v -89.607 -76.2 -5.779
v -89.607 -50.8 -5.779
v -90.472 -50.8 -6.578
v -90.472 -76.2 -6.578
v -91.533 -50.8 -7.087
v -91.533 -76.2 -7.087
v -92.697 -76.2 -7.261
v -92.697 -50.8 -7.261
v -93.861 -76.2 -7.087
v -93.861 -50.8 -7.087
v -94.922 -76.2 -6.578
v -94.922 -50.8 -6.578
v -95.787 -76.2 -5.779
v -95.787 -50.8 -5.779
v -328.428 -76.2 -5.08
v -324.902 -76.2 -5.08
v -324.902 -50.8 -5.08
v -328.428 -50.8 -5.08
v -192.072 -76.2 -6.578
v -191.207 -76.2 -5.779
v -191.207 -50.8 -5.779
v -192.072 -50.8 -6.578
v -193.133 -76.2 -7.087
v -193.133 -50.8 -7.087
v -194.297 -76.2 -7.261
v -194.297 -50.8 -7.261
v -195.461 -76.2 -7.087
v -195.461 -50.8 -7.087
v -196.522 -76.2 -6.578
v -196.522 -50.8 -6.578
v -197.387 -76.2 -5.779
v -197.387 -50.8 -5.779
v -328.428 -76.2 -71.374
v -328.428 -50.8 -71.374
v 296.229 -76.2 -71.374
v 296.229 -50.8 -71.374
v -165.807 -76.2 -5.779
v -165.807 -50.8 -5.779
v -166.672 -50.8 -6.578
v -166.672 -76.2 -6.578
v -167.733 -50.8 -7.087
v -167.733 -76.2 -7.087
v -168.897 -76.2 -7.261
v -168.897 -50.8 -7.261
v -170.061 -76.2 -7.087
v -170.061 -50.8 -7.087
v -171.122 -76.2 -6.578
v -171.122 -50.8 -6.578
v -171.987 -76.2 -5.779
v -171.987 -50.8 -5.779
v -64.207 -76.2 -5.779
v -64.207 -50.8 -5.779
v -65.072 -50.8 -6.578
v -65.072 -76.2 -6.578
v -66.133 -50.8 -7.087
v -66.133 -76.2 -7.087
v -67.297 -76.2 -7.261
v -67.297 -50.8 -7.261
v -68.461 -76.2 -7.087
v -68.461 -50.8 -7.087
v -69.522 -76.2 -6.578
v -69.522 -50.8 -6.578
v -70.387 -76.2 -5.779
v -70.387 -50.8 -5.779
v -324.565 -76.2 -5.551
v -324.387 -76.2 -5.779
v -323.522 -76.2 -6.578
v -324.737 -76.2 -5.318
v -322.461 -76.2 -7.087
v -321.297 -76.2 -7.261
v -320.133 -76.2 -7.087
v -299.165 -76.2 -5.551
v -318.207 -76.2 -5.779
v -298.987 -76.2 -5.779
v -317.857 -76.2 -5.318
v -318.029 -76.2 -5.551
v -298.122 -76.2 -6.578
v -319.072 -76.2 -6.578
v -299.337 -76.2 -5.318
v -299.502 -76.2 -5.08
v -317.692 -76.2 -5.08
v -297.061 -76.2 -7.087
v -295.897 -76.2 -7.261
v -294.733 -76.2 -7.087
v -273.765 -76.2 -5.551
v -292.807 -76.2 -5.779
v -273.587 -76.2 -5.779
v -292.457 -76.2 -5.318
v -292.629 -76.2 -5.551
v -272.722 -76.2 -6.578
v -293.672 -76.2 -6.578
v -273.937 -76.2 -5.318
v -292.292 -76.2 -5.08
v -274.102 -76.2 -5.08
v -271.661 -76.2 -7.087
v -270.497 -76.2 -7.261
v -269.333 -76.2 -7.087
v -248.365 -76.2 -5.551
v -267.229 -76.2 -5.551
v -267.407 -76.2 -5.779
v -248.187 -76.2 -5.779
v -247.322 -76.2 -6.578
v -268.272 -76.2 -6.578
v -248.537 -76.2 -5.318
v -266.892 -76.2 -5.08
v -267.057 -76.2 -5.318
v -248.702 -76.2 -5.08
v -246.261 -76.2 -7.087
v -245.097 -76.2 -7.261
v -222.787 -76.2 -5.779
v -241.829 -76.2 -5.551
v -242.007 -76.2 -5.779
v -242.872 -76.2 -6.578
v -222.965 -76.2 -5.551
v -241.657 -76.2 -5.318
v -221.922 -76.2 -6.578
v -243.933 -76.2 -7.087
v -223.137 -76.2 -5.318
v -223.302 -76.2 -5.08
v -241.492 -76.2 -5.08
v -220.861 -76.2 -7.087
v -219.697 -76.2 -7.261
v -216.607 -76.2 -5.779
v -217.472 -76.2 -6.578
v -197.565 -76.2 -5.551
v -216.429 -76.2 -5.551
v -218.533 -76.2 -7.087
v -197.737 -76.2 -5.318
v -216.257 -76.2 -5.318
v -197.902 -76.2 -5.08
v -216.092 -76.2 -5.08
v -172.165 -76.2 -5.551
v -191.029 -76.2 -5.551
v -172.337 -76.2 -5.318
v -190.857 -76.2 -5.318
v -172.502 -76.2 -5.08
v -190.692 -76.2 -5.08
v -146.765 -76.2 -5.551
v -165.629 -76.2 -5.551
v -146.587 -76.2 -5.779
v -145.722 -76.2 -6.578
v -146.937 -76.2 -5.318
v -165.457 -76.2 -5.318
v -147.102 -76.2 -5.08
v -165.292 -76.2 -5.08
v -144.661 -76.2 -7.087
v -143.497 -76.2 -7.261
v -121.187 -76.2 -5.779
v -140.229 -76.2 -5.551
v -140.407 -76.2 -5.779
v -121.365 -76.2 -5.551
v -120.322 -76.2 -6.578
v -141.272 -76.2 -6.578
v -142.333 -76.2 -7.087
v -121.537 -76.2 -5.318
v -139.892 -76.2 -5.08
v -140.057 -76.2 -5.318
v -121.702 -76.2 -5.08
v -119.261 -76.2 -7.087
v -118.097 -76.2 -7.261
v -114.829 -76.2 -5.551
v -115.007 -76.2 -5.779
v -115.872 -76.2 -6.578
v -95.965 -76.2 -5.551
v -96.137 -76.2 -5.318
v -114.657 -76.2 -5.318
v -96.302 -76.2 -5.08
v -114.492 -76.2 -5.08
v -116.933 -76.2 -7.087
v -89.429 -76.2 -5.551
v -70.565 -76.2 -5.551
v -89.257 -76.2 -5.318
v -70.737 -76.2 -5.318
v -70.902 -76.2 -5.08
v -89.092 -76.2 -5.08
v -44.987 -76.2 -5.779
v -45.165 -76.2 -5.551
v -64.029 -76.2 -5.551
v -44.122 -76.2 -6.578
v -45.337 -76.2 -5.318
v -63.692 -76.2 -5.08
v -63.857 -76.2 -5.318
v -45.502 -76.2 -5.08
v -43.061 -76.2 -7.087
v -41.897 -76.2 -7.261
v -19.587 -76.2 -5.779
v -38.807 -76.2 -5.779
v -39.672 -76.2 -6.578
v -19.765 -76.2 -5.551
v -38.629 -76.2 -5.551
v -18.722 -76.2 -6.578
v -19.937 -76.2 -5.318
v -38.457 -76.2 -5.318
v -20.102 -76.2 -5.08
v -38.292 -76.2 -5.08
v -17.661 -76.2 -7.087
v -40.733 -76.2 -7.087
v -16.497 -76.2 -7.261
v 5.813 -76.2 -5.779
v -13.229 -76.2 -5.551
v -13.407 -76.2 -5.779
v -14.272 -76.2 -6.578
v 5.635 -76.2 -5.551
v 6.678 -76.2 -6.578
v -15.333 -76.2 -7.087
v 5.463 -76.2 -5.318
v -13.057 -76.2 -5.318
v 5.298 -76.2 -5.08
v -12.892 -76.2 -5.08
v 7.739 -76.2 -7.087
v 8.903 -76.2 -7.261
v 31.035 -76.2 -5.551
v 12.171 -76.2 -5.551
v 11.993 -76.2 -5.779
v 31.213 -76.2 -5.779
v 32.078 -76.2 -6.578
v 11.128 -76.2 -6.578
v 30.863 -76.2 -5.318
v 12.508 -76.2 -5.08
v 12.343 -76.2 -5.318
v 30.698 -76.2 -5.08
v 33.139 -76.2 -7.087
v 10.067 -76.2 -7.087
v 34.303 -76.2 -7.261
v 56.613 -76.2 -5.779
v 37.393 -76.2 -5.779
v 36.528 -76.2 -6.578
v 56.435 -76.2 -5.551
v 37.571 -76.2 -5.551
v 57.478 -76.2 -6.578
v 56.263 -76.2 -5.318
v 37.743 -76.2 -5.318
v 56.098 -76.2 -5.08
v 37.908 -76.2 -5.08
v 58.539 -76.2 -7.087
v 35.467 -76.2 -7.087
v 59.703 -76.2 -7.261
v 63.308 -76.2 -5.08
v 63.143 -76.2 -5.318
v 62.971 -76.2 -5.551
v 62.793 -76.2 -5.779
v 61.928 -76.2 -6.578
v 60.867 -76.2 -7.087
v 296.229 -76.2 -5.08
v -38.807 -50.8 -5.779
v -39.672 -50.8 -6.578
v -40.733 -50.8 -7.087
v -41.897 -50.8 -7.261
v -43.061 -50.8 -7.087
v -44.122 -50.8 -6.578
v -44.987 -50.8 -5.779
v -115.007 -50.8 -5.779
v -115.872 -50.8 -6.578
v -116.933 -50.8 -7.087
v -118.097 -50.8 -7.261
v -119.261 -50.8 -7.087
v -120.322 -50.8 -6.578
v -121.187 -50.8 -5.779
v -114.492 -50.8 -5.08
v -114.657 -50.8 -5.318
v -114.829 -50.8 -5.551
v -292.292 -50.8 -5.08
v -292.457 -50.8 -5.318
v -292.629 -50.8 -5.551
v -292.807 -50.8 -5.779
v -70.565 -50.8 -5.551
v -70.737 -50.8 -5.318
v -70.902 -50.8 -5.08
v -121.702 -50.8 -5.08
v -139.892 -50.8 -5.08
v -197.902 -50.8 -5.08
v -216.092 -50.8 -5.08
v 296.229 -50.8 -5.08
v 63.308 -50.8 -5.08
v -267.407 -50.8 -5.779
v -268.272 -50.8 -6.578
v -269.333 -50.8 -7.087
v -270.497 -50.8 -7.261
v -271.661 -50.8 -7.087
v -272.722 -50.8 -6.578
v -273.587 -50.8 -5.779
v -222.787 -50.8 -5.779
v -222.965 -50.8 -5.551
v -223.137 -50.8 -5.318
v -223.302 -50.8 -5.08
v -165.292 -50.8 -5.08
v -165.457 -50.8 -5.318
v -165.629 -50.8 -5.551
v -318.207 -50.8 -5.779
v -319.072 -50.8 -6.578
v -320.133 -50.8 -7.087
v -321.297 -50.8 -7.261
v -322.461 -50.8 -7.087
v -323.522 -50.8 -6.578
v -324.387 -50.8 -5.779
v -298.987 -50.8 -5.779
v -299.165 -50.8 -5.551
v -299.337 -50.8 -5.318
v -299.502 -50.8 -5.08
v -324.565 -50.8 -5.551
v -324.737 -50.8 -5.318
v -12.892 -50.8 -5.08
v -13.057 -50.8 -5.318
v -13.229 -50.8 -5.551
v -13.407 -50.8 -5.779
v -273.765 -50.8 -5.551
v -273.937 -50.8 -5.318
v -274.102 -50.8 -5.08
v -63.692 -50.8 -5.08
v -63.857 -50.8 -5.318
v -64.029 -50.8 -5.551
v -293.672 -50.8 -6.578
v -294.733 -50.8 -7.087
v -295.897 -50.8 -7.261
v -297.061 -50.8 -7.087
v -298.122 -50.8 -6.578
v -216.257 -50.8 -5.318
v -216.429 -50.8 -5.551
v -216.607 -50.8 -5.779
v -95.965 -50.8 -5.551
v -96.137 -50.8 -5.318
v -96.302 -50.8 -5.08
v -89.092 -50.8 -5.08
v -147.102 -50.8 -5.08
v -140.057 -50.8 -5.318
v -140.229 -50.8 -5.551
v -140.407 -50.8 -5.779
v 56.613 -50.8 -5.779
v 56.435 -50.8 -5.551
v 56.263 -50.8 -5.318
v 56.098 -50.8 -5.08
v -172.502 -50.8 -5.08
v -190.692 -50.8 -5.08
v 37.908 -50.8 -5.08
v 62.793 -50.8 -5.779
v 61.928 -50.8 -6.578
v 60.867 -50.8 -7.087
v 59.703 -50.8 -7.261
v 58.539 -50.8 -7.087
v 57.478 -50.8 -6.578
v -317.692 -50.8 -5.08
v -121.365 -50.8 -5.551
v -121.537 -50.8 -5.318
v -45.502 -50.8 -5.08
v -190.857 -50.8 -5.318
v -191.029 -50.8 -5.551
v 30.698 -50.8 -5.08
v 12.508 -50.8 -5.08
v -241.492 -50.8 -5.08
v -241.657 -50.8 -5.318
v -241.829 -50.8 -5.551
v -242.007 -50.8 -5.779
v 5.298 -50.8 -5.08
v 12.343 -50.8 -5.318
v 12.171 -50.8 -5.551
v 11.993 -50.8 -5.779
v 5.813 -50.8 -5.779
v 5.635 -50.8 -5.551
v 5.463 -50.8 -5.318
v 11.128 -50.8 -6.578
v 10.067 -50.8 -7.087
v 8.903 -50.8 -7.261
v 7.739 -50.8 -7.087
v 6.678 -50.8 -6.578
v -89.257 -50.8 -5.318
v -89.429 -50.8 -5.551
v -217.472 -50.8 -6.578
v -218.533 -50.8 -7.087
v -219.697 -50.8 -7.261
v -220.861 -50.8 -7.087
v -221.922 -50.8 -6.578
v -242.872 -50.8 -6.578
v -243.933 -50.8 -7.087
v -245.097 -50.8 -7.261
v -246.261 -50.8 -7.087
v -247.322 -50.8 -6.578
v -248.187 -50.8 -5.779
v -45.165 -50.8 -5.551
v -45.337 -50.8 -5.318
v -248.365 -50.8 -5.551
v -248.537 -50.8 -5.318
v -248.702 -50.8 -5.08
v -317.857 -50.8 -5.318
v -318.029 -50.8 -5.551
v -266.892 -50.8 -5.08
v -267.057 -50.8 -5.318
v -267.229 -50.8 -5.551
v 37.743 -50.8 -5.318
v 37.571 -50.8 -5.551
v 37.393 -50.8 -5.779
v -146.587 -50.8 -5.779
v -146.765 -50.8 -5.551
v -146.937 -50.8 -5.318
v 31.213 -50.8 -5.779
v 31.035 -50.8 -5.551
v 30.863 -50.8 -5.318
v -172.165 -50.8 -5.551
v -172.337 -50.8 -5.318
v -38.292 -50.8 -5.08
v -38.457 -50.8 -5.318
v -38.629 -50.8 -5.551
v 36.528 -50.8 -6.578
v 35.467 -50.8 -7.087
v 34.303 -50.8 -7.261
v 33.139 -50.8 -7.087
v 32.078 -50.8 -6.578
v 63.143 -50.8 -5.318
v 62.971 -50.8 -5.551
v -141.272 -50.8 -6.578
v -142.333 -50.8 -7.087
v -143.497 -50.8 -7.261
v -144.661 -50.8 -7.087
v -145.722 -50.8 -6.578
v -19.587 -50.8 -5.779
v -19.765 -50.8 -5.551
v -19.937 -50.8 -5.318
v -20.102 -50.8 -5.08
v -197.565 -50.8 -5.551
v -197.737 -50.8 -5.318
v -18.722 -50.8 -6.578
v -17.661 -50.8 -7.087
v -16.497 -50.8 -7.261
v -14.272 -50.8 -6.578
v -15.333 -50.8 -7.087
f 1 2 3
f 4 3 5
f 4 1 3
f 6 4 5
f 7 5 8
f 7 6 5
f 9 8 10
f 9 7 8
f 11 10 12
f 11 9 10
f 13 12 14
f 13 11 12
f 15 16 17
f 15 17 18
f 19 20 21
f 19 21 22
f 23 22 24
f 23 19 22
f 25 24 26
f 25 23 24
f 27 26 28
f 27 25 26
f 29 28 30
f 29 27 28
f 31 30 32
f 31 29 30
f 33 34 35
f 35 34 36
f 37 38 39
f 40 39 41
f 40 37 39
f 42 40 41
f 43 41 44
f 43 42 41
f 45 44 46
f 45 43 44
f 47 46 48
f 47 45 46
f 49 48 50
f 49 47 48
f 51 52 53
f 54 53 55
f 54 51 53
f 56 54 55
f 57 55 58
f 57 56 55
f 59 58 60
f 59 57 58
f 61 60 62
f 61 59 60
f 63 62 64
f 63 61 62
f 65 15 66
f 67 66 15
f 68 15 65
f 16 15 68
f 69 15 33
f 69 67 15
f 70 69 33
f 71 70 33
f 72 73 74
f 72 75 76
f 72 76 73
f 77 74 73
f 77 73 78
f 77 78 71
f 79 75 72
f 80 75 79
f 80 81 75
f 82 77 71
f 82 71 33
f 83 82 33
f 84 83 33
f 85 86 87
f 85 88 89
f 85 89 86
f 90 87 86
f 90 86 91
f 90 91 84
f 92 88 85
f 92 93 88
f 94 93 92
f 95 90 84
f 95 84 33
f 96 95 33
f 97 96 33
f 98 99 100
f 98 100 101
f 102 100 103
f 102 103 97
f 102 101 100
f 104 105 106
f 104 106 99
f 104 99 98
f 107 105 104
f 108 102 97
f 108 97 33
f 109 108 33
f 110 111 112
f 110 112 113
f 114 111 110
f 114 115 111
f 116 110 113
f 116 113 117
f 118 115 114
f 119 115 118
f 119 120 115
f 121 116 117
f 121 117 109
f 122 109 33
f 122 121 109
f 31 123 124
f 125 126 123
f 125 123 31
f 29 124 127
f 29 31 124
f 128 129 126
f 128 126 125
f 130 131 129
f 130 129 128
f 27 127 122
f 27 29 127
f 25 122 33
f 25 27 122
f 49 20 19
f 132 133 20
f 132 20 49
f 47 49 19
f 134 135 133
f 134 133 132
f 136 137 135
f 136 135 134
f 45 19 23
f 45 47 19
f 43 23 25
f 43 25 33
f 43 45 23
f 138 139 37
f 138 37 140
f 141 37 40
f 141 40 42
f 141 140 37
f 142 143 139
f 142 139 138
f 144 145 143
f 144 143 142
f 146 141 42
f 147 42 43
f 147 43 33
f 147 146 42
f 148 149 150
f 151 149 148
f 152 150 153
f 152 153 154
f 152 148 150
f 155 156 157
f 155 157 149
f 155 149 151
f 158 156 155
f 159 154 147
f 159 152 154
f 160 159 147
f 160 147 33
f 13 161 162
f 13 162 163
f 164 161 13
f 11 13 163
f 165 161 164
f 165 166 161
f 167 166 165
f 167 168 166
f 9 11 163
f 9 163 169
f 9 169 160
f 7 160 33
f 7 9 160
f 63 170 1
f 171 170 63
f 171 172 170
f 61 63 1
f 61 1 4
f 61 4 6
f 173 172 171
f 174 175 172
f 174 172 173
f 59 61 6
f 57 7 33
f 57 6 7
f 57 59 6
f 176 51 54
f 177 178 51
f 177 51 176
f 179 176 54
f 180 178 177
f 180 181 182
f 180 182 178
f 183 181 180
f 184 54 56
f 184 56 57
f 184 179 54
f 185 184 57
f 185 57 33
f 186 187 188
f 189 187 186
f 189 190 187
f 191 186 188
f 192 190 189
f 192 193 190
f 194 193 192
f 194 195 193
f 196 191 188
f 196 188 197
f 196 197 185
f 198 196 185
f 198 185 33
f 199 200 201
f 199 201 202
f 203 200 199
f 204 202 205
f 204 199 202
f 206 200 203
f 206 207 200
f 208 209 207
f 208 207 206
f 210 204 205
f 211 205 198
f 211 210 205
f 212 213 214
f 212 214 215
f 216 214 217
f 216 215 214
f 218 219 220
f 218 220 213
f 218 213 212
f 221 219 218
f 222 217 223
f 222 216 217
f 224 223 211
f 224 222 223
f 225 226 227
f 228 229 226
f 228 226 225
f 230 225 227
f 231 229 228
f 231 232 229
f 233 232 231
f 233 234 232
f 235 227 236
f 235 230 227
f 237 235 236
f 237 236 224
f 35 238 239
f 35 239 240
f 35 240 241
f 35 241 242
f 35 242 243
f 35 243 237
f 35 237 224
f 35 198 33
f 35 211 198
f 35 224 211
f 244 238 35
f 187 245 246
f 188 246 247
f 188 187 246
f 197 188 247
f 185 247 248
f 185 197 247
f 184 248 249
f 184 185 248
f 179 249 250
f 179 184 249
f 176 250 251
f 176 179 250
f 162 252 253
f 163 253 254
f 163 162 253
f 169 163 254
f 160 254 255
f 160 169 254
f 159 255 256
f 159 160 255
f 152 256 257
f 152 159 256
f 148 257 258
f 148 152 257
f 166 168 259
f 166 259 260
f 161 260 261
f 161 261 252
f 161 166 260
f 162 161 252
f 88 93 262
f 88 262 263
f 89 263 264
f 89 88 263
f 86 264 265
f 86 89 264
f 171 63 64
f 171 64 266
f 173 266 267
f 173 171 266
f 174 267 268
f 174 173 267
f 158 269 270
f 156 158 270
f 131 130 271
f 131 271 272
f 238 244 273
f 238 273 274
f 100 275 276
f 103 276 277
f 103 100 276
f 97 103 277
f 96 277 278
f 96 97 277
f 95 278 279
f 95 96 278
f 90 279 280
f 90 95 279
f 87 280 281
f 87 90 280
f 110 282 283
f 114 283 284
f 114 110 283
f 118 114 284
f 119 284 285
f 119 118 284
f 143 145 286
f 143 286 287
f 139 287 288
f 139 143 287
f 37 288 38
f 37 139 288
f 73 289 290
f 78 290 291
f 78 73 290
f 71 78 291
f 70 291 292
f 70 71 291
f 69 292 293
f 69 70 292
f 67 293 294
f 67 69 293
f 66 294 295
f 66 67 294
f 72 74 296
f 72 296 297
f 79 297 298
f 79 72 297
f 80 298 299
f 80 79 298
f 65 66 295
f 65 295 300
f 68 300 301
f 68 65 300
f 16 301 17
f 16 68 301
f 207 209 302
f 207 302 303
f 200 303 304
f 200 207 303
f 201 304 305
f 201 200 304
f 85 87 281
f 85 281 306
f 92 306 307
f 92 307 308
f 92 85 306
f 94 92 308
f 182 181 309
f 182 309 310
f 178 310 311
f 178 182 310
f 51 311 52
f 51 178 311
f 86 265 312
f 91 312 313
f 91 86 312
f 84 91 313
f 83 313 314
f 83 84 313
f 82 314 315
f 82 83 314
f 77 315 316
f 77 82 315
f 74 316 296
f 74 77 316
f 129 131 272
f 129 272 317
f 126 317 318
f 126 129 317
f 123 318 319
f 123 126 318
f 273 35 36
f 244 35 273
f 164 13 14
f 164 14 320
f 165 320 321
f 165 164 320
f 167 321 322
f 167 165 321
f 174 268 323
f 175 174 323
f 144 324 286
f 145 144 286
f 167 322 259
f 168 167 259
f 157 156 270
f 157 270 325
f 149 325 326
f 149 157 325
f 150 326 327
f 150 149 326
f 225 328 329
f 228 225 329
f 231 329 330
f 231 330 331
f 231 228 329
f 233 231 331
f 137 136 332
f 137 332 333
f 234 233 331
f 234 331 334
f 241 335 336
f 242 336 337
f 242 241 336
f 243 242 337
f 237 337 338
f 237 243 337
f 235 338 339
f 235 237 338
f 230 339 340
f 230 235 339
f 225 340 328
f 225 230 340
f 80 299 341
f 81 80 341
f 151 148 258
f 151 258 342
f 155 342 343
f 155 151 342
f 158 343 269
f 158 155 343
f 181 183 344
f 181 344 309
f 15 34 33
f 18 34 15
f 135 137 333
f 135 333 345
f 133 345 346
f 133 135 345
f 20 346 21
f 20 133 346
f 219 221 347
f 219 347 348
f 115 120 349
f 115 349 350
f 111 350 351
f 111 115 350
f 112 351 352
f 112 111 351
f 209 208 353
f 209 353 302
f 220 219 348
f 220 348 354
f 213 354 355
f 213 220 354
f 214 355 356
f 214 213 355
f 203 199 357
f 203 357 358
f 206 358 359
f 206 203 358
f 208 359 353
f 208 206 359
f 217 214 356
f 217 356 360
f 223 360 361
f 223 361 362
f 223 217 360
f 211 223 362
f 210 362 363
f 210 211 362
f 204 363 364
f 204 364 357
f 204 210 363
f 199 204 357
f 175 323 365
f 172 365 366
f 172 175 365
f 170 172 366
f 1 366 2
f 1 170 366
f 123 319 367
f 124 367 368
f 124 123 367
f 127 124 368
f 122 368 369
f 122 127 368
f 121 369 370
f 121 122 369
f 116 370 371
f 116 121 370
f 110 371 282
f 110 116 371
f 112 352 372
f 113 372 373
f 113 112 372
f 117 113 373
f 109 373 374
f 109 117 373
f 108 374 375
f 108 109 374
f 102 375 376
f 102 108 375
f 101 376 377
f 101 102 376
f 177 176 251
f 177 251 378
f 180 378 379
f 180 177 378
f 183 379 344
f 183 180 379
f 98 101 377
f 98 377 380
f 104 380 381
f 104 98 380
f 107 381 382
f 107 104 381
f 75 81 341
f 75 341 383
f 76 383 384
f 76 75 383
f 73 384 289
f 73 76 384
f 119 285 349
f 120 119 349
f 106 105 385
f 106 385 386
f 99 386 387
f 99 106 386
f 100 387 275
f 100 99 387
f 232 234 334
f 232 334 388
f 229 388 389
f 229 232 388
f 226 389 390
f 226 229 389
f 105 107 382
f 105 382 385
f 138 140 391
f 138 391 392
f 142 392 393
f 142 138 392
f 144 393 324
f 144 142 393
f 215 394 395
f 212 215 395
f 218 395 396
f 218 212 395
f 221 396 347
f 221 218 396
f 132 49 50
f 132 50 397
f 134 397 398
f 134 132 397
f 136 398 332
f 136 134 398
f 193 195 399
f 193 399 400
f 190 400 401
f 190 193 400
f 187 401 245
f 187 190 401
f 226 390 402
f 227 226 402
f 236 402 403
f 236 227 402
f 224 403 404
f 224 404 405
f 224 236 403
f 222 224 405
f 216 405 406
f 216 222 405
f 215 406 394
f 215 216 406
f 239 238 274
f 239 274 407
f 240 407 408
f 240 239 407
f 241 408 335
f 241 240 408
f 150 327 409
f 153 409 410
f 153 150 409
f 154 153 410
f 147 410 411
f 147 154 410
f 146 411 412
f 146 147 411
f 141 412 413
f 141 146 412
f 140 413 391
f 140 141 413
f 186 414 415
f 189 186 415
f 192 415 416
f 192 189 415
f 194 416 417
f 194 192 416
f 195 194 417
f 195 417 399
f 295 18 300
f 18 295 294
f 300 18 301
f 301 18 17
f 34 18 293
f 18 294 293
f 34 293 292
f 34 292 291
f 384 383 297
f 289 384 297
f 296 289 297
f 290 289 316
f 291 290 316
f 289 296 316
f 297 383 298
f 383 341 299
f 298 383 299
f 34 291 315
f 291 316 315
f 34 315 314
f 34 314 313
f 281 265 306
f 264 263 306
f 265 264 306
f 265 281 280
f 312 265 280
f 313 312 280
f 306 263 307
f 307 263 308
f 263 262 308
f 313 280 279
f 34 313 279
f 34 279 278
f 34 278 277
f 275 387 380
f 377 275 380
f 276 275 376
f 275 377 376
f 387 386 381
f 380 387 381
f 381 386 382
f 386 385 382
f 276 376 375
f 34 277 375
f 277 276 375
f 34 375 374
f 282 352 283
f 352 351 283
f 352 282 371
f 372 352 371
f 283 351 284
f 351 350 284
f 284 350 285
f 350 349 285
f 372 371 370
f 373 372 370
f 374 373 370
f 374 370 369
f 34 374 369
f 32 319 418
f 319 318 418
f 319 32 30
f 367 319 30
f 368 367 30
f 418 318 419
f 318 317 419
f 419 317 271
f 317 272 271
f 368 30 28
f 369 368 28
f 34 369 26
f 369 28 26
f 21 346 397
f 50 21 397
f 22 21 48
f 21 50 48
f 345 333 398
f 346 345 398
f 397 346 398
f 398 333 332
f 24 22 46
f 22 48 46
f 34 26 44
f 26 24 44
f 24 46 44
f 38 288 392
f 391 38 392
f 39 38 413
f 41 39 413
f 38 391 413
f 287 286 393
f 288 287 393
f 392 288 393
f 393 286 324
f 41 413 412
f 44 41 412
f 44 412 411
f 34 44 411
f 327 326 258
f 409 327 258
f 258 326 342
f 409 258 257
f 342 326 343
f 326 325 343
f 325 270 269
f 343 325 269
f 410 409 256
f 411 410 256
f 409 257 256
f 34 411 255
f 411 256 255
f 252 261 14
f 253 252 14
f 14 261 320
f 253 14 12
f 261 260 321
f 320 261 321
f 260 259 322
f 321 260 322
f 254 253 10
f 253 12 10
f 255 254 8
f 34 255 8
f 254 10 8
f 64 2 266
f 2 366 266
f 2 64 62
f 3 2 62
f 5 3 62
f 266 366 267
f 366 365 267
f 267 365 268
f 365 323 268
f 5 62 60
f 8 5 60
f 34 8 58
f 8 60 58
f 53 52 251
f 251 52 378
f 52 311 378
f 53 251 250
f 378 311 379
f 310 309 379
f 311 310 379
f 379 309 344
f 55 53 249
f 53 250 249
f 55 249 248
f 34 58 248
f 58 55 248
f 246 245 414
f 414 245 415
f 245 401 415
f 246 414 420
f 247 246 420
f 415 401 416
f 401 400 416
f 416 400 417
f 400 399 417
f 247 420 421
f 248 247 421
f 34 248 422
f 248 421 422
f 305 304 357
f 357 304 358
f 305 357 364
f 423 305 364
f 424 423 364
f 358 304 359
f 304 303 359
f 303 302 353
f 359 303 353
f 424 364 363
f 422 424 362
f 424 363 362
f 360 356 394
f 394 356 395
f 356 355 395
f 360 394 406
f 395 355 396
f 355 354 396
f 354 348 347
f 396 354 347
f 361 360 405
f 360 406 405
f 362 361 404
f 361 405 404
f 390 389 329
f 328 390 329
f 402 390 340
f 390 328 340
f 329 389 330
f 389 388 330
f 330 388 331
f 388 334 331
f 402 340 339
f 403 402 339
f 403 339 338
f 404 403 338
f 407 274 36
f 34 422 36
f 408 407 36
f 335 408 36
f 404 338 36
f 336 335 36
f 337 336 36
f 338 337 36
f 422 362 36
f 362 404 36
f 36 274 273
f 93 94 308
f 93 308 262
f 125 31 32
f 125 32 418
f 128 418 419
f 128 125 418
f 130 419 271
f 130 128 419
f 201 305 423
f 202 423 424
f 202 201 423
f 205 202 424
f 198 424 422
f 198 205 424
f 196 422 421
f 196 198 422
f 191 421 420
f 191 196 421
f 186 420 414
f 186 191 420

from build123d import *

# Parameters (mm, degrees)
F0_W     = 624.656601
F0_H     = 71.374
F1_DEPTH = 76.2
F2_SIZE  = 5.08
F4_DEPTH = 25.4


with BuildPart() as f1:
    # F0 (on Front) → F1 (new body)
    with BuildSketch(Plane.XZ):
        with Locations((-16.099394, -35.687)):
            Rectangle(F0_W, F0_H)
    extrude(amount=F1_DEPTH)

    # F2
    f2_edges = [f1.edges().sort_by_distance(p)[0] for p in [
        (-16.099394, -76.2, 0),
        (-16.099394, 0, 0),
    ]]
    chamfer(f2_edges, length=F2_SIZE)

    # F3 (on face) → F4 (intersect)
    with BuildSketch(Plane.XZ.offset(76.2)):
        with BuildLine():
            ThreePointArc((-324.387073, -5.779197), (-324.651668, -5.434988), (-324.901614, -5.08))
            Line((-324.901614, -5.08), (-328.427695, -5.08))
            Line((-328.427695, -5.08), (-328.427695, -71.374))
            Line((-328.427695, -71.374), (296.228906, -71.374))
            Line((296.228906, -71.374), (296.228906, -5.08))
            Line((296.228906, -5.08), (63.307897, -5.08))
            ThreePointArc((63.307897, -5.08), (63.057951, -5.434988), (62.793356, -5.779197))
            ThreePointArc((62.793356, -5.779197), (59.703141, -7.261437), (56.612927, -5.779197))
            ThreePointArc((56.612927, -5.779197), (56.348332, -5.434988), (56.098386, -5.08))
            Line((56.098386, -5.08), (37.907897, -5.08))
            ThreePointArc((37.907897, -5.08), (37.657951, -5.434988), (37.393356, -5.779197))
            ThreePointArc((37.393356, -5.779197), (34.303141, -7.261437), (31.212927, -5.779197))
            ThreePointArc((31.212927, -5.779197), (30.948332, -5.434988), (30.698386, -5.08))
            Line((30.698386, -5.08), (12.507897, -5.08))
            ThreePointArc((12.507897, -5.08), (12.257951, -5.434988), (11.993356, -5.779197))
            ThreePointArc((11.993356, -5.779197), (8.903141, -7.261437), (5.812927, -5.779197))
            ThreePointArc((5.812927, -5.779197), (5.548332, -5.434988), (5.298386, -5.08))
            Line((5.298386, -5.08), (-12.892103, -5.08))
            ThreePointArc((-12.892103, -5.08), (-13.142049, -5.434988), (-13.406644, -5.779197))
            ThreePointArc((-13.406644, -5.779197), (-16.496859, -7.261437), (-19.587073, -5.779197))
            ThreePointArc((-19.587073, -5.779197), (-19.851668, -5.434988), (-20.101614, -5.08))
            Line((-20.101614, -5.08), (-38.292103, -5.08))
            ThreePointArc((-38.292103, -5.08), (-38.542049, -5.434988), (-38.806644, -5.779197))
            ThreePointArc((-38.806644, -5.779197), (-41.896859, -7.261437), (-44.987073, -5.779197))
            ThreePointArc((-44.987073, -5.779197), (-45.251668, -5.434988), (-45.501614, -5.08))
            Line((-45.501614, -5.08), (-63.692103, -5.08))
            ThreePointArc((-63.692103, -5.08), (-63.942049, -5.434988), (-64.206644, -5.779197))
            ThreePointArc((-64.206644, -5.779197), (-67.296859, -7.261437), (-70.387073, -5.779197))
            ThreePointArc((-70.387073, -5.779197), (-70.651668, -5.434988), (-70.901614, -5.08))
            Line((-70.901614, -5.08), (-89.092103, -5.08))
            ThreePointArc((-89.092103, -5.08), (-89.342049, -5.434988), (-89.606644, -5.779197))
            ThreePointArc((-89.606644, -5.779197), (-92.696859, -7.261437), (-95.787073, -5.779197))
            ThreePointArc((-95.787073, -5.779197), (-96.051668, -5.434988), (-96.301614, -5.08))
            Line((-96.301614, -5.08), (-114.492103, -5.08))
            ThreePointArc((-114.492103, -5.08), (-114.742049, -5.434988), (-115.006644, -5.779197))
            ThreePointArc((-115.006644, -5.779197), (-118.096859, -7.261437), (-121.187073, -5.779197))
            ThreePointArc((-121.187073, -5.779197), (-121.451668, -5.434988), (-121.701614, -5.08))
            Line((-121.701614, -5.08), (-139.892103, -5.08))
            ThreePointArc((-139.892103, -5.08), (-140.142049, -5.434988), (-140.406644, -5.779197))
            ThreePointArc((-140.406644, -5.779197), (-143.496859, -7.261437), (-146.587073, -5.779197))
            ThreePointArc((-146.587073, -5.779197), (-146.851668, -5.434988), (-147.101614, -5.08))
            Line((-147.101614, -5.08), (-165.292103, -5.08))
            ThreePointArc((-165.292103, -5.08), (-165.542049, -5.434988), (-165.806644, -5.779197))
            ThreePointArc((-165.806644, -5.779197), (-168.896859, -7.261437), (-171.987073, -5.779197))
            ThreePointArc((-171.987073, -5.779197), (-172.251668, -5.434988), (-172.501614, -5.08))
            Line((-172.501614, -5.08), (-190.692103, -5.08))
            ThreePointArc((-190.692103, -5.08), (-190.942049, -5.434988), (-191.206644, -5.779197))
            ThreePointArc((-191.206644, -5.779197), (-194.296859, -7.261437), (-197.387073, -5.779197))
            ThreePointArc((-197.387073, -5.779197), (-197.651668, -5.434988), (-197.901614, -5.08))
            Line((-197.901614, -5.08), (-216.092103, -5.08))
            ThreePointArc((-216.092103, -5.08), (-216.342049, -5.434988), (-216.606644, -5.779197))
            ThreePointArc((-216.606644, -5.779197), (-219.696859, -7.261437), (-222.787073, -5.779197))
            ThreePointArc((-222.787073, -5.779197), (-223.051668, -5.434988), (-223.301614, -5.08))
            Line((-223.301614, -5.08), (-241.492103, -5.08))
            ThreePointArc((-241.492103, -5.08), (-241.742049, -5.434988), (-242.006644, -5.779197))
            ThreePointArc((-242.006644, -5.779197), (-245.096859, -7.261437), (-248.187073, -5.779197))
            ThreePointArc((-248.187073, -5.779197), (-248.451668, -5.434988), (-248.701614, -5.08))
            Line((-248.701614, -5.08), (-266.892103, -5.08))
            ThreePointArc((-266.892103, -5.08), (-267.142049, -5.434988), (-267.406644, -5.779197))
            ThreePointArc((-267.406644, -5.779197), (-270.496859, -7.261437), (-273.587073, -5.779197))
            ThreePointArc((-273.587073, -5.779197), (-273.851668, -5.434988), (-274.101614, -5.08))
            Line((-274.101614, -5.08), (-292.292103, -5.08))
            ThreePointArc((-292.292103, -5.08), (-292.542049, -5.434988), (-292.806644, -5.779197))
            ThreePointArc((-292.806644, -5.779197), (-295.896859, -7.261437), (-298.987073, -5.779197))
            ThreePointArc((-298.987073, -5.779197), (-299.251668, -5.434988), (-299.501614, -5.08))
            Line((-299.501614, -5.08), (-317.692103, -5.08))
            ThreePointArc((-317.692103, -5.08), (-317.942049, -5.434988), (-318.206644, -5.779197))
            ThreePointArc((-318.206644, -5.779197), (-321.296859, -7.261437), (-324.387073, -5.779197))
        make_face()
    extrude(amount=-F4_DEPTH, mode=Mode.INTERSECT)


solid = f1.part
